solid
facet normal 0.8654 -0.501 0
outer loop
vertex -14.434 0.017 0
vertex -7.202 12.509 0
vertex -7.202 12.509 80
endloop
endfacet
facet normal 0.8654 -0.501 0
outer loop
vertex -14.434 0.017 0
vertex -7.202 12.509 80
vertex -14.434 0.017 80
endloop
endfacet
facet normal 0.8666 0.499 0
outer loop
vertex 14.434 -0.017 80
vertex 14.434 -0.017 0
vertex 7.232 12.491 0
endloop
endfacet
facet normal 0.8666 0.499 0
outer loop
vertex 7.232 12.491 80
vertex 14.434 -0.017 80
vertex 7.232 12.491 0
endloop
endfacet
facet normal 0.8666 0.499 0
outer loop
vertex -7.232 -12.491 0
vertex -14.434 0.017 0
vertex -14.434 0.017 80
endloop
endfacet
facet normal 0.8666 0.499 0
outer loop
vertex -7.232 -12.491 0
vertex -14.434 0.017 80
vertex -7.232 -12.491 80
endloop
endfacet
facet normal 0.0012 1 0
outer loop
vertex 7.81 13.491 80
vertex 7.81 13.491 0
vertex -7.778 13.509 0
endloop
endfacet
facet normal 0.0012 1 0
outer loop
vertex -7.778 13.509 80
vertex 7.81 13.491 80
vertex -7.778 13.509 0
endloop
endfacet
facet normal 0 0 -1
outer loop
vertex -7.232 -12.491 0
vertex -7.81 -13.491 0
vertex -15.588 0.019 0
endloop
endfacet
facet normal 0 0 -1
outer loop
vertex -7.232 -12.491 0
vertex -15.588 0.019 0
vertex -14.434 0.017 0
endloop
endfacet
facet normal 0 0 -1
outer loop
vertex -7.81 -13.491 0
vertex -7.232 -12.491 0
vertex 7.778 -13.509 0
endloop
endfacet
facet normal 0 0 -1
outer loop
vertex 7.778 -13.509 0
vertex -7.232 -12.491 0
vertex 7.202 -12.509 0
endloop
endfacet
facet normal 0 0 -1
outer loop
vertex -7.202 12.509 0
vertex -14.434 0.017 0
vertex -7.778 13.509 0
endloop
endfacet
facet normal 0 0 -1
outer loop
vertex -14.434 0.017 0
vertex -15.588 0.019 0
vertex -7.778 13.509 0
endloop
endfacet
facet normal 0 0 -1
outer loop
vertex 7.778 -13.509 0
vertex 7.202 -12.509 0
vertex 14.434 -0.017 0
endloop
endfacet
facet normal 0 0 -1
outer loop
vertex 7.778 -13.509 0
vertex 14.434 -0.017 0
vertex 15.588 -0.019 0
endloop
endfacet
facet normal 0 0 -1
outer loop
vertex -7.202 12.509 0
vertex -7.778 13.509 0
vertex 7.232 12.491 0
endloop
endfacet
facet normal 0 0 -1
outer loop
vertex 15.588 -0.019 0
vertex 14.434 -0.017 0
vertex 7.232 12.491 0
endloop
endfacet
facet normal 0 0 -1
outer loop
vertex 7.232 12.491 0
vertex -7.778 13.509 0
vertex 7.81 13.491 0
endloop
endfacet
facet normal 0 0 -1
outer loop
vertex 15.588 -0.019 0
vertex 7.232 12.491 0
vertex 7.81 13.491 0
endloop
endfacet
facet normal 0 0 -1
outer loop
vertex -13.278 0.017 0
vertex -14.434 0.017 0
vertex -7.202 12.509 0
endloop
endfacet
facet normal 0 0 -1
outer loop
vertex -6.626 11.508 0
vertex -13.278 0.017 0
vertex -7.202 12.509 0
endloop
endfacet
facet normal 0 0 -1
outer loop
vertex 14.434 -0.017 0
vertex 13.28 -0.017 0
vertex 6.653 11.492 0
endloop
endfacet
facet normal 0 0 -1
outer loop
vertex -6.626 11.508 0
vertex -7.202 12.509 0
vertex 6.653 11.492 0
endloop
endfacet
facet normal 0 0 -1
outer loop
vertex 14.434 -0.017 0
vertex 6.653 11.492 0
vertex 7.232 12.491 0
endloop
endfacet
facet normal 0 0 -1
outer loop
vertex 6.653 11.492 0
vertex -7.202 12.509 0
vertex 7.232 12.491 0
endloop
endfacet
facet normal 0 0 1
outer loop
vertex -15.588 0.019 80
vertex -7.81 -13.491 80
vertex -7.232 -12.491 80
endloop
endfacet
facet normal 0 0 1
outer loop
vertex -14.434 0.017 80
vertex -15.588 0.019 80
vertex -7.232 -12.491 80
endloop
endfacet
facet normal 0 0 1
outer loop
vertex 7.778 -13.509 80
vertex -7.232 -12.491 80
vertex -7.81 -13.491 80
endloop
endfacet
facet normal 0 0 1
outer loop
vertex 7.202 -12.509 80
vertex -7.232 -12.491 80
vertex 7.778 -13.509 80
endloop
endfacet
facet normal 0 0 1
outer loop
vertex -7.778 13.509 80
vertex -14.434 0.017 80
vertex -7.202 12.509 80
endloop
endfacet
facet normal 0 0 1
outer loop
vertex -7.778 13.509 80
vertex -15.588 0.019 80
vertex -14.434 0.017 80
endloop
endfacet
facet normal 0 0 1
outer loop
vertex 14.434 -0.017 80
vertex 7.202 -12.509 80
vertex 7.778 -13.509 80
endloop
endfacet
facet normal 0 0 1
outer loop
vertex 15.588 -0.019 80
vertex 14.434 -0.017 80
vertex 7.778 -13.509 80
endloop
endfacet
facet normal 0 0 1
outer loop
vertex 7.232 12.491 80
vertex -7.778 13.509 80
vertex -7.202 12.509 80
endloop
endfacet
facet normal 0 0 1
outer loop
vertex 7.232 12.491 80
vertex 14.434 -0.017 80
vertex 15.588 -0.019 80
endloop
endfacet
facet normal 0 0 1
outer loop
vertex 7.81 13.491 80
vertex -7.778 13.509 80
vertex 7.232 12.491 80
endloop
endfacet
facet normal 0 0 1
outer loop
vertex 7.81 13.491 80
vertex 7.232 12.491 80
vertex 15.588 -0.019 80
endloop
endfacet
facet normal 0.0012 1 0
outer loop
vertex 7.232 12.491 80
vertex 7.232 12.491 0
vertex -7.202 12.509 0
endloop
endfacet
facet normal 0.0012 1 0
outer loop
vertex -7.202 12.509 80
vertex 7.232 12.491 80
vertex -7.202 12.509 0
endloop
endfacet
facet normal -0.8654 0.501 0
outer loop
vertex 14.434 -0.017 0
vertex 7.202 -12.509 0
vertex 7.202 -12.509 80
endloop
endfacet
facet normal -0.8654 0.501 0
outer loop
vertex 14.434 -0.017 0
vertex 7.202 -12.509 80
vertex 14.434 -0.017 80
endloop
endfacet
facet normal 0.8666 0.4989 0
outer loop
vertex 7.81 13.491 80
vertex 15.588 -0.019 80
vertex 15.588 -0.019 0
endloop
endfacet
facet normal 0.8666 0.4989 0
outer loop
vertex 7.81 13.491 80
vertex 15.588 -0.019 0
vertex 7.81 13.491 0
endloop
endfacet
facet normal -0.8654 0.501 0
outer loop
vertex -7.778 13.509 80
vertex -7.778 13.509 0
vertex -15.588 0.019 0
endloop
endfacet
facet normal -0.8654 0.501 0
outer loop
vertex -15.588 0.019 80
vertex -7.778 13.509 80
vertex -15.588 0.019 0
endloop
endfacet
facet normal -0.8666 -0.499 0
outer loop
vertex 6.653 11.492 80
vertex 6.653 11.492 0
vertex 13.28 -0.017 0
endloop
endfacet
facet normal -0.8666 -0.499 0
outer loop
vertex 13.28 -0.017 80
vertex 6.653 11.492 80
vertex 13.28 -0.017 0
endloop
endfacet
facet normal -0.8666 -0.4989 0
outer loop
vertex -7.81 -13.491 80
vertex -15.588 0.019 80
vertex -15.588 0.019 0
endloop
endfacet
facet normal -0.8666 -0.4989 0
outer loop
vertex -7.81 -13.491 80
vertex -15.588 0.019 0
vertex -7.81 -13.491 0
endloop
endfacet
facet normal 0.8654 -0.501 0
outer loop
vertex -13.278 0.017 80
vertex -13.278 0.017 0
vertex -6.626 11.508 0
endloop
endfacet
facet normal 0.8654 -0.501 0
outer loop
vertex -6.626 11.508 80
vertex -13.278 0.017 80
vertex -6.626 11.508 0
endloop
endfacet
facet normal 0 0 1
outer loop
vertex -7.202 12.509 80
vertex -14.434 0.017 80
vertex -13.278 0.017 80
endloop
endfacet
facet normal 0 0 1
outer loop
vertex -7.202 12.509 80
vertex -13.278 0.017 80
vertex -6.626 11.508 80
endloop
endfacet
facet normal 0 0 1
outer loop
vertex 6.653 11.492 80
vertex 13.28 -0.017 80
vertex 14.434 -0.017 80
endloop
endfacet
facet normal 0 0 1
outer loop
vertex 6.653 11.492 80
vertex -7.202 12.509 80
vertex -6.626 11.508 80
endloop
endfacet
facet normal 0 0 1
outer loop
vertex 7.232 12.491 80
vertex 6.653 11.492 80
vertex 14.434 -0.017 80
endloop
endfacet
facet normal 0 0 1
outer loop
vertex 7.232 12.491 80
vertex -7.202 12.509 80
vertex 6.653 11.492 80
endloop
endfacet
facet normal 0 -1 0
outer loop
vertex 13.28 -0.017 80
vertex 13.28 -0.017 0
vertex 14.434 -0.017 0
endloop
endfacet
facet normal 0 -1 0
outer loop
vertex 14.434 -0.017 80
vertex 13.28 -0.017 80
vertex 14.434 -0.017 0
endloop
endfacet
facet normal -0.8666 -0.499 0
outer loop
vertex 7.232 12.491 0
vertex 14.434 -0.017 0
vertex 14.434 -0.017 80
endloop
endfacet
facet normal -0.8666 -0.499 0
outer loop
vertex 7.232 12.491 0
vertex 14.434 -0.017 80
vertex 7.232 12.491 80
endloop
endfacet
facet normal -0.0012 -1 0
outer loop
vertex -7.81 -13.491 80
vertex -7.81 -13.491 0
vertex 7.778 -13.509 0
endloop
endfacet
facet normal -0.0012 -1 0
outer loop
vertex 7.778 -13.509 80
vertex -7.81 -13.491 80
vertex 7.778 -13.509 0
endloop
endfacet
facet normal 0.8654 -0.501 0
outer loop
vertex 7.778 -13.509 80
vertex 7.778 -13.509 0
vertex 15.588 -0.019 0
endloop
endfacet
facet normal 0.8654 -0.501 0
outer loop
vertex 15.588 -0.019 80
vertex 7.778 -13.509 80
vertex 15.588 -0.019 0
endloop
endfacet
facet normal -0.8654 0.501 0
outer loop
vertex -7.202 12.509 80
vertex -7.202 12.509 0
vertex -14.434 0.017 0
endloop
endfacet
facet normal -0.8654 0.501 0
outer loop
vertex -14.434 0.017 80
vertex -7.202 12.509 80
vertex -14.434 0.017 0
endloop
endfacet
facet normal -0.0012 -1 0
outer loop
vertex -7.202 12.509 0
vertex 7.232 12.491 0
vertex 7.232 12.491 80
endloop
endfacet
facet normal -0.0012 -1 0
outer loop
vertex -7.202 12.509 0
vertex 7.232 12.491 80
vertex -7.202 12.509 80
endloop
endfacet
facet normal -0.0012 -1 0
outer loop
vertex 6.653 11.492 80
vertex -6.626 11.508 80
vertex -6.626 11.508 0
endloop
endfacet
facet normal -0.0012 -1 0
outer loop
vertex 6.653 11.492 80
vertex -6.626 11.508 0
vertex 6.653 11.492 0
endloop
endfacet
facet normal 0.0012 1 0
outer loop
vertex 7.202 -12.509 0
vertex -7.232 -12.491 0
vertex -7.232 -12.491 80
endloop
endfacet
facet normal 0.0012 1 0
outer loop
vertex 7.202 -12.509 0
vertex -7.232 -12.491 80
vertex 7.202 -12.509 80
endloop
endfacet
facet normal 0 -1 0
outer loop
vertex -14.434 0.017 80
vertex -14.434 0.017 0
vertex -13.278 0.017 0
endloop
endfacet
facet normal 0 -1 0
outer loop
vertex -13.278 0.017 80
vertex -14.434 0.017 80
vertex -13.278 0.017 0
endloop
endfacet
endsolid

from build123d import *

# Parameters (mm, degrees)
BOSS_EXTRUDE1_DEPTH = 80
BOSS_EXTRUDE2_DEPTH = 80


with BuildPart() as part:
    # Sketch1 → Boss-Extrude1 (new body)
    with BuildSketch(Plane.XY):
        Polygon((8.098458923, 12.990315485), (7.810382493, 13.49066067), (-7.778063607, 13.509319987), (-8.067337033, 13.009665888), (-15.299172675, 0.518313416), (-15.588446101, 0.018659317), (-7.810382493, -13.49066067), (7.778063607, -13.509319987), (15.588446101, -0.018659317), (15.300369671, 0.481685867), align=None)
        Polygon((-7.201910748, 12.508629618), (7.231835642, 12.491352472), (14.433746389, -0.017277146), (7.201910748, -12.508629618), (-7.231835642, -12.491352472), (-14.433746389, 0.017277146), align=None, mode=Mode.SUBTRACT)
    extrude(amount=BOSS_EXTRUDE1_DEPTH)


with BuildPart() as body_2:
    # Sketch1<3> → Boss-Extrude2 (new body)
    with BuildSketch(Plane.XY):
        Polygon((14.433746389, -0.017277146), (7.231835642, 12.491352472), (-7.201910748, 12.508629618), (-14.433746389, 0.017277146), (-13.278246474, 0.017277146), (-6.625757888, 11.507939248), (6.65328879, 11.492044274), (13.279842471, -0.017277146), align=None)
    extrude(amount=BOSS_EXTRUDE2_DEPTH)


solid = Compound([part.part, body_2.part])
